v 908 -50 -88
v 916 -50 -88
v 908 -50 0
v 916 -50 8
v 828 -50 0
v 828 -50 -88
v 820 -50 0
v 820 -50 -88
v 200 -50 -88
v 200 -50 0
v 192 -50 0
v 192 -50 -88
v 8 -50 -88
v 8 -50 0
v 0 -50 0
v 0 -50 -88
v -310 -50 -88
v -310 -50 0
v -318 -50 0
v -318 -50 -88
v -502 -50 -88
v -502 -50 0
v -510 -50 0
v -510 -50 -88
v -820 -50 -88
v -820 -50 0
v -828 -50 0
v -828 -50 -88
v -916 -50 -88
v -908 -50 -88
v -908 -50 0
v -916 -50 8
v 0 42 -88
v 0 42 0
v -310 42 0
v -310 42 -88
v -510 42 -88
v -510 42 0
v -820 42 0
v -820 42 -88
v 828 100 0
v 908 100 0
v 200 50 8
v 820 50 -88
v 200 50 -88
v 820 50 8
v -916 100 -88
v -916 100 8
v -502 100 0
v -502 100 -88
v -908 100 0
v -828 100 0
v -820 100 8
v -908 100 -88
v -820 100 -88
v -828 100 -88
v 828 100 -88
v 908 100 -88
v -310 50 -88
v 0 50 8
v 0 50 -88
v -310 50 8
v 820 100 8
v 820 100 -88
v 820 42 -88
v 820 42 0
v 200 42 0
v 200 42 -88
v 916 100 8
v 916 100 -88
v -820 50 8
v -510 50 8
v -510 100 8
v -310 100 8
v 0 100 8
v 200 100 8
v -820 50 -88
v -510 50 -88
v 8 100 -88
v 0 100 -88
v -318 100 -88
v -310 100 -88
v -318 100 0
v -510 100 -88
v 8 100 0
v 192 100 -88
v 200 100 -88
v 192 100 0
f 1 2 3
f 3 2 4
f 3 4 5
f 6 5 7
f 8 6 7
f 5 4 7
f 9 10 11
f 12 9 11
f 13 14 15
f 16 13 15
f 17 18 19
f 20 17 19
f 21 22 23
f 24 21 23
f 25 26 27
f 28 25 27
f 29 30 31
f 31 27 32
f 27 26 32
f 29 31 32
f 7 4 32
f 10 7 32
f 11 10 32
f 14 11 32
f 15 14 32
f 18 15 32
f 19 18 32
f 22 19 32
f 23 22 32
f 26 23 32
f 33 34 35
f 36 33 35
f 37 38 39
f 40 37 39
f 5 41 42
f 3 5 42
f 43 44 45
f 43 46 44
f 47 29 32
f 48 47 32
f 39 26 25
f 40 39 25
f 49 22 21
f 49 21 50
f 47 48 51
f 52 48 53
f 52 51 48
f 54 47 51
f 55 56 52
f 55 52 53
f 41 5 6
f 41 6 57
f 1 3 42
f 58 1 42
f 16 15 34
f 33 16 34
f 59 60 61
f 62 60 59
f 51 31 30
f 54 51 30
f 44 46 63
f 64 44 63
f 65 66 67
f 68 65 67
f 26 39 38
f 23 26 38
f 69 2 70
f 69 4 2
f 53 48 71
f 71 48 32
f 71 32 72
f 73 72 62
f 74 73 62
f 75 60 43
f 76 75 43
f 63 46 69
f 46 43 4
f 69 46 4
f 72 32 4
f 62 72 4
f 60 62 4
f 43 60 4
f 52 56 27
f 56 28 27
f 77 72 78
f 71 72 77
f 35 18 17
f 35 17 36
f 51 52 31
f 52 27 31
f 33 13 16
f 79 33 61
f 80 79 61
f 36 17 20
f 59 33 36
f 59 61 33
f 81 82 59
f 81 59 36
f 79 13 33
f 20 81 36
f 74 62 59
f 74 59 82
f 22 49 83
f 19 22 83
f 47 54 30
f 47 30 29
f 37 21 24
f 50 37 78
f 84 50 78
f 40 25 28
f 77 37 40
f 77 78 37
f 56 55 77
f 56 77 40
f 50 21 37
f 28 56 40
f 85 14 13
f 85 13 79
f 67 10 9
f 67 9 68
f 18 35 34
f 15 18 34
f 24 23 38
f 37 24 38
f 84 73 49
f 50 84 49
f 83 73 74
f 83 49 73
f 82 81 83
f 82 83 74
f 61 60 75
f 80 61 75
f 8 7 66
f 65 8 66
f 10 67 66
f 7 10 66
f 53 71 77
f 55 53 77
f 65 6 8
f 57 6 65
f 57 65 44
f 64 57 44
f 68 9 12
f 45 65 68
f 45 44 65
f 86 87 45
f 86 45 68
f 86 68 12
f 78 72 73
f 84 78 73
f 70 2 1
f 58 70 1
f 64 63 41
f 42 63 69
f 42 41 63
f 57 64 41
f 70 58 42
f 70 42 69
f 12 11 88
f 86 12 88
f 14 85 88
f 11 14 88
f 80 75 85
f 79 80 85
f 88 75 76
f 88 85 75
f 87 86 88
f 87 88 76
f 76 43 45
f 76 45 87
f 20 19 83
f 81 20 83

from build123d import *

# Parameters (mm, degrees)
SKETCH1_W           = 1832
SKETCH1_H           = 100
BOSS_EXTRUDE1_DEPTH = 8
SKETCH2_W           = 8
SKETCH2_H           = 100
BOSS_EXTRUDE2_DEPTH = 88
BOSS_EXTRUDE3_DEPTH = 50
SKETCH4_W           = 620
SKETCH4_H           = 8
SKETCH4_W_2         = 310
BOSS_EXTRUDE4_DEPTH = 88


with BuildPart() as part:
    # Sketch1 → Boss-Extrude1 (new body)
    with BuildSketch(Plane.XY):
        Rectangle(SKETCH1_W, SKETCH1_H)
    extrude(amount=BOSS_EXTRUDE1_DEPTH)

    # Sketch2 → Boss-Extrude2 (add)
    with BuildSketch(Plane(origin=(0, 0, 0), x_dir=(-1, 0, 0), z_dir=(0, 0, -1))):
        with Locations((-912, 0)):
            Rectangle(SKETCH2_W, SKETCH2_H)
        with Locations((912, 0)):
            Rectangle(SKETCH2_W, SKETCH2_H)
        with Locations((824, 0)):
            Rectangle(SKETCH2_W, SKETCH2_H)
        with Locations((506, 0)):
            Rectangle(SKETCH2_W, SKETCH2_H)
        with Locations((314, 0)):
            Rectangle(SKETCH2_W, SKETCH2_H)
        with Locations((-4, 0)):
            Rectangle(SKETCH2_W, SKETCH2_H)
        with Locations((-196, 0)):
            Rectangle(SKETCH2_W, SKETCH2_H)
        with Locations((-824, 0)):
            Rectangle(SKETCH2_W, SKETCH2_H)
    extrude(amount=BOSS_EXTRUDE2_DEPTH)

    # Sketch3 → Boss-Extrude3 (add)
    with BuildSketch(Plane(origin=(0, 50, 0), x_dir=(1, 0, 0), z_dir=(0, 1, 0))):
        Polygon((-916, 88), (-916, -8), (-820, -8), (-820, 88), (-828, 88), (-828, 0), (-908, 0), (-908, 88), align=None)
        Polygon((-510, 88), (-510, -8), (-310, -8), (-310, 88), (-318, 88), (-318, 0), (-502, 0), (-502, 88), align=None)
        Polygon((0, 88), (0, -8), (200, -8), (200, 88), (192, 88), (192, 0), (8, 0), (8, 88), align=None)
        Polygon((820, 88), (820, -8), (916, -8), (916, 88), (908, 88), (908, 0), (828, 0), (828, 88), align=None)
    extrude(amount=BOSS_EXTRUDE3_DEPTH)

    # Sketch4 → Boss-Extrude4 (add)
    with BuildSketch(Plane(origin=(0, 0, 0), x_dir=(-1, 0, 0), z_dir=(0, 0, -1))):
        with Locations((-510, 46)):
            Rectangle(SKETCH4_W, SKETCH4_H)
        with Locations((155, 46)):
            Rectangle(SKETCH4_W_2, SKETCH4_H)
        with Locations((665, 46)):
            Rectangle(SKETCH4_W_2, SKETCH4_H)
    extrude(amount=BOSS_EXTRUDE4_DEPTH)


solid = part.part
